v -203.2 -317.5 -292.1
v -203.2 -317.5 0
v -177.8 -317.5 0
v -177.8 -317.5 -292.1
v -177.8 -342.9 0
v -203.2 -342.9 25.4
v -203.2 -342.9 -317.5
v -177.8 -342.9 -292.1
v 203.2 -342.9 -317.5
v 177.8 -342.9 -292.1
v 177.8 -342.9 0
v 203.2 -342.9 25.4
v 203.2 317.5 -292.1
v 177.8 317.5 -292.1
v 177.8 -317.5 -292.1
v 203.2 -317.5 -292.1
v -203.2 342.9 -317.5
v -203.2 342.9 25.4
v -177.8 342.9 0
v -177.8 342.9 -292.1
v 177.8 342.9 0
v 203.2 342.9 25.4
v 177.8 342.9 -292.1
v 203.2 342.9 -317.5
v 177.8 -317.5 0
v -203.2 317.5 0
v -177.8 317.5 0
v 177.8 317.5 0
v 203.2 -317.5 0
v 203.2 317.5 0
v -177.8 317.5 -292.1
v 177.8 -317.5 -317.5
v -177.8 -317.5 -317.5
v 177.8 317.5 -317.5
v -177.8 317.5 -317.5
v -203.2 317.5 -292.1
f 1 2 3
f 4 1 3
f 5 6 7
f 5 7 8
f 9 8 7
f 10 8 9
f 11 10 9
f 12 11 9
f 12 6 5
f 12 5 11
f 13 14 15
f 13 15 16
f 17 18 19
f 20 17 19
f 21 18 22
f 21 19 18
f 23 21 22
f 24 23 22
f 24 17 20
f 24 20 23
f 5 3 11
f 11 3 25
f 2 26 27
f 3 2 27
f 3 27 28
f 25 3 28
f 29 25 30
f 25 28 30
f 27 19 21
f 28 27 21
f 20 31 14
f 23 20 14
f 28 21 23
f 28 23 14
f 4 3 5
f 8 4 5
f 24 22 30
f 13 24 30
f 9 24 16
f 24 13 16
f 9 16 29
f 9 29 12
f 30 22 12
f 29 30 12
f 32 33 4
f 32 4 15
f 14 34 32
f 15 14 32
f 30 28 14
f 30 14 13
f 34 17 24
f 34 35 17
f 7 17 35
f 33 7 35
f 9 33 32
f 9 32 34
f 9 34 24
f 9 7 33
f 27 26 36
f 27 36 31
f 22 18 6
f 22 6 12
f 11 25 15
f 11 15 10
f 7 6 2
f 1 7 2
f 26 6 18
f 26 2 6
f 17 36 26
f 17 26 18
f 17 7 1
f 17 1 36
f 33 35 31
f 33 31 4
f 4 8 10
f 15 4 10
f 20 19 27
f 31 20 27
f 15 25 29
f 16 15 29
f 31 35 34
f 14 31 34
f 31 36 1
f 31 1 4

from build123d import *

# Parameters (mm, degrees)
F0_W     = 406.4
F0_H     = 685.8
F1_DEPTH = 25.4
F2_W     = 25.4
F2_H     = 25.4
F3_DEPTH = 317.5
F4_W     = 406.4
F4_H     = 685.8
F5_DEPTH = 25.4
F6_W     = 355.6
F6_H     = 635
F7_DEPTH = 25.4


with BuildPart() as f1:
    # F0 (on Top) → F1 (new body)
    with BuildSketch(Plane.XY):
        Rectangle(F0_W, F0_H)
    extrude(amount=F1_DEPTH)

    # F2 (on face) → F3 (join)
    with BuildSketch(Plane(origin=(0, 0, 0), x_dir=(1, 0, 0), z_dir=(0, 0, -1))):
        with Locations((190.5, 330.2)):
            Rectangle(F2_W, F2_H)
        with Locations((-190.5, -330.2)):
            Rectangle(F2_W, F2_H)
        with Locations((190.5, -330.2)):
            Rectangle(F2_W, F2_H)
        with Locations((-190.5, 330.2)):
            Rectangle(F2_W, F2_H)
    extrude(amount=F3_DEPTH)

    # F4 (on face) → F5 (join)
    with BuildSketch(Plane(origin=(0, 0, -317.5), x_dir=(1, 0, 0), z_dir=(0, 0, -1))):
        Rectangle(F4_W, F4_H)
    extrude(amount=-F5_DEPTH)

    # F6 (on face) → F7 (cut)
    with BuildSketch(Plane(origin=(0, 0, -317.5), x_dir=(1, 0, 0), z_dir=(0, 0, -1))):
        Rectangle(F6_W, F6_H)
    extrude(amount=-F7_DEPTH, mode=Mode.SUBTRACT)


solid = f1.part
